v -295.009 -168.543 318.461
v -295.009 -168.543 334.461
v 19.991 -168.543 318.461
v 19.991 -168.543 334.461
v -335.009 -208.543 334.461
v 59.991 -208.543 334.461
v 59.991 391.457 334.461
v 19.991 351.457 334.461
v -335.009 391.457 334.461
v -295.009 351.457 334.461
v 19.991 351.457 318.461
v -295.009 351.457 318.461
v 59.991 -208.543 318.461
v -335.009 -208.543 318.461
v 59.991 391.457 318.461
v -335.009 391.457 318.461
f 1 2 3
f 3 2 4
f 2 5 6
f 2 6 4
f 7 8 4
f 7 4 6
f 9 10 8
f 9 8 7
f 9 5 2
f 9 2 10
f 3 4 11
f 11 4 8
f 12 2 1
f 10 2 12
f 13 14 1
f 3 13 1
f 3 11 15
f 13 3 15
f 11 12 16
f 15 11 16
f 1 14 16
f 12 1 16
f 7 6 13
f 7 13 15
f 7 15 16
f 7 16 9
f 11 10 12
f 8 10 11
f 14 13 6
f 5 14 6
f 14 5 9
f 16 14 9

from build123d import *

# Parameters (mm, degrees)
BOTTOM_PLATE_START     = -335.008892233
BOTTOM_PLATE_OUTLINE_W = 600
BOTTOM_PLATE_OUTLINE_H = 16
BOTTOM_PLATE_DEPTH     = 395
SKETCH1_W              = 315
SKETCH1_H              = 520
CUT_EXTRUDE1_DEPTH     = 516.485669921


# Read off the part's stored shape, not the designer's step: bottom-plate
with BuildPart() as part:
    # bottom-plate outline → bottom-plate (new body)
    with BuildSketch(Plane.YZ.offset(BOTTOM_PLATE_START)):
        with Locations((91.456917194, 326.460719179)):
            Rectangle(BOTTOM_PLATE_OUTLINE_W, BOTTOM_PLATE_OUTLINE_H)
    extrude(amount=BOTTOM_PLATE_DEPTH)

    # Sketch1 → Cut-Extrude1 (cut, through all)
    with BuildSketch(Plane.XY.offset(334.460719179)):
        with Locations((-137.508892233, 91.456917194)):
            Rectangle(SKETCH1_W, SKETCH1_H)
    extrude(amount=-CUT_EXTRUDE1_DEPTH, mode=Mode.SUBTRACT)


solid = part.part
